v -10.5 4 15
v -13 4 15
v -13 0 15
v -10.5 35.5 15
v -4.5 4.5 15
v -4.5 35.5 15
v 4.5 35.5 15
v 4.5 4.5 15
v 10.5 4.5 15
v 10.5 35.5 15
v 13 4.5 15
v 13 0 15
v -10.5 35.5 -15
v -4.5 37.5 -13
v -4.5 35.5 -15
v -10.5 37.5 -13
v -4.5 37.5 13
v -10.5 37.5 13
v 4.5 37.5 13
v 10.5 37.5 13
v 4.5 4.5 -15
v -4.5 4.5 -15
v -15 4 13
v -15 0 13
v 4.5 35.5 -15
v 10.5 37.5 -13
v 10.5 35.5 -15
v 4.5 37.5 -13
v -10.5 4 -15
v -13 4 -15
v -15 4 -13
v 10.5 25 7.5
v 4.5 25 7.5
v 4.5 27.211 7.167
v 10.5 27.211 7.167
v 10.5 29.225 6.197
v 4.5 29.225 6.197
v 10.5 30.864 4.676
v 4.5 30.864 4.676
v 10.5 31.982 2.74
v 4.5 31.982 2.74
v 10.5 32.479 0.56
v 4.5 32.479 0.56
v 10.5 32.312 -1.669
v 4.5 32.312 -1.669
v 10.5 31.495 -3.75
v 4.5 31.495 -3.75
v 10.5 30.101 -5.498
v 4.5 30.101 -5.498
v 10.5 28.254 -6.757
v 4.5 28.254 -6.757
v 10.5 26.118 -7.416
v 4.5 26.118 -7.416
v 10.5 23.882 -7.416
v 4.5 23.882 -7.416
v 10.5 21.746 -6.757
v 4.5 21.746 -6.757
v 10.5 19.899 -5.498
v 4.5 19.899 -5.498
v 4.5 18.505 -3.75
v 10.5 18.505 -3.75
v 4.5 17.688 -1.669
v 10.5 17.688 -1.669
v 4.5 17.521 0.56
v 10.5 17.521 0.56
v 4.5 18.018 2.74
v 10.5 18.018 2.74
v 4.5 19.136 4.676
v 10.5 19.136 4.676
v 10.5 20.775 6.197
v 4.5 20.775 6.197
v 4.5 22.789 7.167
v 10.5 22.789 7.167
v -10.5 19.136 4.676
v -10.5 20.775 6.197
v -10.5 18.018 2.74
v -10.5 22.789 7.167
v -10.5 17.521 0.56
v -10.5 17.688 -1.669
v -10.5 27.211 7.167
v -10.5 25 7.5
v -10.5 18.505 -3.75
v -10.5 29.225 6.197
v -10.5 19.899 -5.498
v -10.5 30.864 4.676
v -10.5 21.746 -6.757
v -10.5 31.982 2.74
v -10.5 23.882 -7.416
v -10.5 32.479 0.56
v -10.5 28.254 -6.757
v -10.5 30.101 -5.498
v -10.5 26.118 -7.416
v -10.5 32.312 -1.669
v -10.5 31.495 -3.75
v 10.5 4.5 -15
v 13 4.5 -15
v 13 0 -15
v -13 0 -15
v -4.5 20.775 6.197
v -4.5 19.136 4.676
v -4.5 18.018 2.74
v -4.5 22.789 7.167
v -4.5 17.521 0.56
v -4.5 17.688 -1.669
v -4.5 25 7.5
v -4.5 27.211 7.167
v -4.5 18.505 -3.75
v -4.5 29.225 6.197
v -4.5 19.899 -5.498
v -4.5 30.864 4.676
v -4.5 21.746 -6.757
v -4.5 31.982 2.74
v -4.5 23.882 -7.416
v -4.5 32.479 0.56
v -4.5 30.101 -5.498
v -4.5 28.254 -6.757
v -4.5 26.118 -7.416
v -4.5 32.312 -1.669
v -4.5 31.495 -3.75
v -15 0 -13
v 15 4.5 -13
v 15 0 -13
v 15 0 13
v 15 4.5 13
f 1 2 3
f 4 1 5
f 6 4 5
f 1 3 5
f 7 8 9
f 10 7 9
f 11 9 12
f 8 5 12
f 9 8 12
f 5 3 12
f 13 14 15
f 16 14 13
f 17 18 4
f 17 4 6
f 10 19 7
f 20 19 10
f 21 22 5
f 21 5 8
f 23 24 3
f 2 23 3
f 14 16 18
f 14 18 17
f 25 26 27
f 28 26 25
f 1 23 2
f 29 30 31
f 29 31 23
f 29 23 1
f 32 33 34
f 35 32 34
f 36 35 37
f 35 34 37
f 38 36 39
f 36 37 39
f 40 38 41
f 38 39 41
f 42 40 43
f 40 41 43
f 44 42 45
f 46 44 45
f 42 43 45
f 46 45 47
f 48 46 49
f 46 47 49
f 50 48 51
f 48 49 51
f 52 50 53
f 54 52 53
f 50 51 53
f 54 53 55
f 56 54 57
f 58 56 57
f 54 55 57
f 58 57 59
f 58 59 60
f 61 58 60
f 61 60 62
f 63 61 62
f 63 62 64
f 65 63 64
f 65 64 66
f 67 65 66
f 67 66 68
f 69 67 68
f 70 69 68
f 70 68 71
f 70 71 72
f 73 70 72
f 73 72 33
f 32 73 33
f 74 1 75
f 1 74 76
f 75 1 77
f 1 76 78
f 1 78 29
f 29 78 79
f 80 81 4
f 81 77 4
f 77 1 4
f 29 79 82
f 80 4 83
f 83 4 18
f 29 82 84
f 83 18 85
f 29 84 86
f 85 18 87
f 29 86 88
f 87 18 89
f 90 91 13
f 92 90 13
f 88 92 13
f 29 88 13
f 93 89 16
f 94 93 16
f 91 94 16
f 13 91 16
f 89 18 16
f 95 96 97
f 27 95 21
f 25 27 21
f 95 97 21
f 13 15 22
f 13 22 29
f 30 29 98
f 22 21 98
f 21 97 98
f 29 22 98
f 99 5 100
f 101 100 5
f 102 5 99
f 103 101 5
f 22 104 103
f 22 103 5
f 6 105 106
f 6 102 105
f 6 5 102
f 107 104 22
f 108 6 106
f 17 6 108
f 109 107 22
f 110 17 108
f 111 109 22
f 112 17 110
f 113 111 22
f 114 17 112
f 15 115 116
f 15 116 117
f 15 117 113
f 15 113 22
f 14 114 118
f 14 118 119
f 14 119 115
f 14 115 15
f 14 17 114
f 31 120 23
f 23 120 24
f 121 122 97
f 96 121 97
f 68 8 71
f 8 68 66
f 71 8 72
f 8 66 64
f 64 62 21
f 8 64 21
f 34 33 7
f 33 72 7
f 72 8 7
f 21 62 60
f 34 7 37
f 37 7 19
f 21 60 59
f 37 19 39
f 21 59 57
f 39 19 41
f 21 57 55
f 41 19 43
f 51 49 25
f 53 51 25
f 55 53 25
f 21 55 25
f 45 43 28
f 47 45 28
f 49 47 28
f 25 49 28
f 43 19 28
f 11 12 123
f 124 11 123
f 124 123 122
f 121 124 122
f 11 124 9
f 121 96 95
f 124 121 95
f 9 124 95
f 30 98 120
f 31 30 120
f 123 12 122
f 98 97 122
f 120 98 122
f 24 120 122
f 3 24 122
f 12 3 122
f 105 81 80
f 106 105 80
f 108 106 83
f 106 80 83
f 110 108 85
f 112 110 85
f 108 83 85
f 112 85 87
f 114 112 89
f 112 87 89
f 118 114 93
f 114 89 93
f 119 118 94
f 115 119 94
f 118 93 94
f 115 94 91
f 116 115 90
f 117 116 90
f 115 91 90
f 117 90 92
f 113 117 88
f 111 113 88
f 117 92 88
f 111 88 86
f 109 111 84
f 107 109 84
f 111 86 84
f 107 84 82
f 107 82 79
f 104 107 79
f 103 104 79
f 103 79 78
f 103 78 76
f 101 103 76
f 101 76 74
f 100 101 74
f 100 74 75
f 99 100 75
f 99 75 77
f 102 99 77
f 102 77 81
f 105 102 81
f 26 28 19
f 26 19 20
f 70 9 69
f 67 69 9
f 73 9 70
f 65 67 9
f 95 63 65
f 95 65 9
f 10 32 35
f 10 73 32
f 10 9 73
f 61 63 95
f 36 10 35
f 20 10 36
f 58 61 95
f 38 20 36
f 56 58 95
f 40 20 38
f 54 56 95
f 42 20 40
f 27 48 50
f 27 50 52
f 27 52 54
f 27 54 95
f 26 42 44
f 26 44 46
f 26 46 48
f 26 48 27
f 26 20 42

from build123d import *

# Parameters (mm, degrees)
EXTRUDE_1_DEPTH          = 37.5
SKETCH_4_W               = 2.5
SKETCH_4_H               = 30
CUT_EXTRUDE_2_DEPTH      = 33.5
CUT_EXTRUDE_3_DEPTH      = 44.084219849
CUT_EXTRUDE_3_DEPTH_BACK = 33.5
CUT_EXTRUDE_4_DEPTH      = 33
SKETCH_12_W              = 9
SKETCH_12_H              = 30
CUT_EXTRUDE_7_DEPTH      = 33
CUT_EXTRUDE_8_REACH      = 49.765
SKETCH_16_R              = 7.5
CHAMFER_2_SIZE           = 2


with BuildPart() as part:
    # 草图1 → 凸台-拉伸1 (new body)
    with BuildSketch(Plane(origin=(0, 0, 0), x_dir=(1, 0, 0), z_dir=(0, 1, 0))):
        Polygon((13, -15), (15, -13), (15, 13), (13, 15), (-13, 15), (-15, 13), (-15, -13), (-13, -15), align=None)
    extrude(amount=EXTRUDE_1_DEPTH)

    # 草图4 → 切除-拉伸2 (cut)
    with BuildSketch(Plane(origin=(0, 37.5, 0), x_dir=(1, 0, 0), z_dir=(0, 1, 0))):
        with Locations((-11.75, 0)):
            Rectangle(SKETCH_4_W, SKETCH_4_H)
    extrude(amount=-CUT_EXTRUDE_2_DEPTH, mode=Mode.SUBTRACT)

    # 草图9 → 切除-拉伸3 (cut, two sides: drawn at the far end of the back side and taken through both)
    with BuildSketch(Plane(origin=(0, 37.5, 0), x_dir=(1, 0, 0), z_dir=(0, 1, 0)).offset(-CUT_EXTRUDE_3_DEPTH_BACK)):
        Polygon((-13, -15), (-13, 15), (-15, 13), (-15, -13), align=None)
    extrude(amount=CUT_EXTRUDE_3_DEPTH + CUT_EXTRUDE_3_DEPTH_BACK, mode=Mode.SUBTRACT)

    # 草图11 → 切除-拉伸4 (cut)
    with BuildSketch(Plane(origin=(0, 37.5, 0), x_dir=(1, 0, 0), z_dir=(0, 1, 0))):
        Polygon((10.5, -15), (10.5, 15), (13, 15), (15, 13), (15, -13), (13, -15), align=None)
    extrude(amount=-CUT_EXTRUDE_4_DEPTH, mode=Mode.SUBTRACT)

    # 草图12 → 切除-拉伸7 (cut)
    with BuildSketch(Plane(origin=(0, 37.5, 0), x_dir=(1, 0, 0), z_dir=(0, 1, 0))):
        Rectangle(SKETCH_12_W, SKETCH_12_H)
    extrude(amount=-CUT_EXTRUDE_7_DEPTH, mode=Mode.SUBTRACT)

    # 切除-拉伸8: up to this face of the body (flat: up to its plane)
    cut_extrude_8_end = Plane(part.part.faces().sort_by_distance((10.5, 21, 0))[0])
    # 草图16 → 切除-拉伸8 (cut, up to the picked face)
    with BuildSketch(Plane.ZY.offset(10.5), mode=Mode.PRIVATE) as cut_extrude_8_sk1:
        with Locations((0, 25)):
            Circle(SKETCH_16_R)
    cut_extrude_8_tool1 = split(extrude(cut_extrude_8_sk1.sketch, amount=-CUT_EXTRUDE_8_REACH, mode=Mode.PRIVATE), bisect_by=cut_extrude_8_end, keep=Keep.BOTH, mode=Mode.PRIVATE)
    add(cut_extrude_8_tool1.solids().sort_by(Axis((-10.5, 25, 0), (1, 0, 0)))[0], mode=Mode.SUBTRACT)

    # 倒角2
    chamfer_2_edges = [part.edges().sort_by_distance(p)[0] for p in [
        (-7.5, 37.5, 15),
        (-7.5, 37.5, -15),
        (7.5, 37.5, -15),
        (7.5, 37.5, 15),
    ]]
    chamfer(chamfer_2_edges, length=CHAMFER_2_SIZE)


solid = part.part
